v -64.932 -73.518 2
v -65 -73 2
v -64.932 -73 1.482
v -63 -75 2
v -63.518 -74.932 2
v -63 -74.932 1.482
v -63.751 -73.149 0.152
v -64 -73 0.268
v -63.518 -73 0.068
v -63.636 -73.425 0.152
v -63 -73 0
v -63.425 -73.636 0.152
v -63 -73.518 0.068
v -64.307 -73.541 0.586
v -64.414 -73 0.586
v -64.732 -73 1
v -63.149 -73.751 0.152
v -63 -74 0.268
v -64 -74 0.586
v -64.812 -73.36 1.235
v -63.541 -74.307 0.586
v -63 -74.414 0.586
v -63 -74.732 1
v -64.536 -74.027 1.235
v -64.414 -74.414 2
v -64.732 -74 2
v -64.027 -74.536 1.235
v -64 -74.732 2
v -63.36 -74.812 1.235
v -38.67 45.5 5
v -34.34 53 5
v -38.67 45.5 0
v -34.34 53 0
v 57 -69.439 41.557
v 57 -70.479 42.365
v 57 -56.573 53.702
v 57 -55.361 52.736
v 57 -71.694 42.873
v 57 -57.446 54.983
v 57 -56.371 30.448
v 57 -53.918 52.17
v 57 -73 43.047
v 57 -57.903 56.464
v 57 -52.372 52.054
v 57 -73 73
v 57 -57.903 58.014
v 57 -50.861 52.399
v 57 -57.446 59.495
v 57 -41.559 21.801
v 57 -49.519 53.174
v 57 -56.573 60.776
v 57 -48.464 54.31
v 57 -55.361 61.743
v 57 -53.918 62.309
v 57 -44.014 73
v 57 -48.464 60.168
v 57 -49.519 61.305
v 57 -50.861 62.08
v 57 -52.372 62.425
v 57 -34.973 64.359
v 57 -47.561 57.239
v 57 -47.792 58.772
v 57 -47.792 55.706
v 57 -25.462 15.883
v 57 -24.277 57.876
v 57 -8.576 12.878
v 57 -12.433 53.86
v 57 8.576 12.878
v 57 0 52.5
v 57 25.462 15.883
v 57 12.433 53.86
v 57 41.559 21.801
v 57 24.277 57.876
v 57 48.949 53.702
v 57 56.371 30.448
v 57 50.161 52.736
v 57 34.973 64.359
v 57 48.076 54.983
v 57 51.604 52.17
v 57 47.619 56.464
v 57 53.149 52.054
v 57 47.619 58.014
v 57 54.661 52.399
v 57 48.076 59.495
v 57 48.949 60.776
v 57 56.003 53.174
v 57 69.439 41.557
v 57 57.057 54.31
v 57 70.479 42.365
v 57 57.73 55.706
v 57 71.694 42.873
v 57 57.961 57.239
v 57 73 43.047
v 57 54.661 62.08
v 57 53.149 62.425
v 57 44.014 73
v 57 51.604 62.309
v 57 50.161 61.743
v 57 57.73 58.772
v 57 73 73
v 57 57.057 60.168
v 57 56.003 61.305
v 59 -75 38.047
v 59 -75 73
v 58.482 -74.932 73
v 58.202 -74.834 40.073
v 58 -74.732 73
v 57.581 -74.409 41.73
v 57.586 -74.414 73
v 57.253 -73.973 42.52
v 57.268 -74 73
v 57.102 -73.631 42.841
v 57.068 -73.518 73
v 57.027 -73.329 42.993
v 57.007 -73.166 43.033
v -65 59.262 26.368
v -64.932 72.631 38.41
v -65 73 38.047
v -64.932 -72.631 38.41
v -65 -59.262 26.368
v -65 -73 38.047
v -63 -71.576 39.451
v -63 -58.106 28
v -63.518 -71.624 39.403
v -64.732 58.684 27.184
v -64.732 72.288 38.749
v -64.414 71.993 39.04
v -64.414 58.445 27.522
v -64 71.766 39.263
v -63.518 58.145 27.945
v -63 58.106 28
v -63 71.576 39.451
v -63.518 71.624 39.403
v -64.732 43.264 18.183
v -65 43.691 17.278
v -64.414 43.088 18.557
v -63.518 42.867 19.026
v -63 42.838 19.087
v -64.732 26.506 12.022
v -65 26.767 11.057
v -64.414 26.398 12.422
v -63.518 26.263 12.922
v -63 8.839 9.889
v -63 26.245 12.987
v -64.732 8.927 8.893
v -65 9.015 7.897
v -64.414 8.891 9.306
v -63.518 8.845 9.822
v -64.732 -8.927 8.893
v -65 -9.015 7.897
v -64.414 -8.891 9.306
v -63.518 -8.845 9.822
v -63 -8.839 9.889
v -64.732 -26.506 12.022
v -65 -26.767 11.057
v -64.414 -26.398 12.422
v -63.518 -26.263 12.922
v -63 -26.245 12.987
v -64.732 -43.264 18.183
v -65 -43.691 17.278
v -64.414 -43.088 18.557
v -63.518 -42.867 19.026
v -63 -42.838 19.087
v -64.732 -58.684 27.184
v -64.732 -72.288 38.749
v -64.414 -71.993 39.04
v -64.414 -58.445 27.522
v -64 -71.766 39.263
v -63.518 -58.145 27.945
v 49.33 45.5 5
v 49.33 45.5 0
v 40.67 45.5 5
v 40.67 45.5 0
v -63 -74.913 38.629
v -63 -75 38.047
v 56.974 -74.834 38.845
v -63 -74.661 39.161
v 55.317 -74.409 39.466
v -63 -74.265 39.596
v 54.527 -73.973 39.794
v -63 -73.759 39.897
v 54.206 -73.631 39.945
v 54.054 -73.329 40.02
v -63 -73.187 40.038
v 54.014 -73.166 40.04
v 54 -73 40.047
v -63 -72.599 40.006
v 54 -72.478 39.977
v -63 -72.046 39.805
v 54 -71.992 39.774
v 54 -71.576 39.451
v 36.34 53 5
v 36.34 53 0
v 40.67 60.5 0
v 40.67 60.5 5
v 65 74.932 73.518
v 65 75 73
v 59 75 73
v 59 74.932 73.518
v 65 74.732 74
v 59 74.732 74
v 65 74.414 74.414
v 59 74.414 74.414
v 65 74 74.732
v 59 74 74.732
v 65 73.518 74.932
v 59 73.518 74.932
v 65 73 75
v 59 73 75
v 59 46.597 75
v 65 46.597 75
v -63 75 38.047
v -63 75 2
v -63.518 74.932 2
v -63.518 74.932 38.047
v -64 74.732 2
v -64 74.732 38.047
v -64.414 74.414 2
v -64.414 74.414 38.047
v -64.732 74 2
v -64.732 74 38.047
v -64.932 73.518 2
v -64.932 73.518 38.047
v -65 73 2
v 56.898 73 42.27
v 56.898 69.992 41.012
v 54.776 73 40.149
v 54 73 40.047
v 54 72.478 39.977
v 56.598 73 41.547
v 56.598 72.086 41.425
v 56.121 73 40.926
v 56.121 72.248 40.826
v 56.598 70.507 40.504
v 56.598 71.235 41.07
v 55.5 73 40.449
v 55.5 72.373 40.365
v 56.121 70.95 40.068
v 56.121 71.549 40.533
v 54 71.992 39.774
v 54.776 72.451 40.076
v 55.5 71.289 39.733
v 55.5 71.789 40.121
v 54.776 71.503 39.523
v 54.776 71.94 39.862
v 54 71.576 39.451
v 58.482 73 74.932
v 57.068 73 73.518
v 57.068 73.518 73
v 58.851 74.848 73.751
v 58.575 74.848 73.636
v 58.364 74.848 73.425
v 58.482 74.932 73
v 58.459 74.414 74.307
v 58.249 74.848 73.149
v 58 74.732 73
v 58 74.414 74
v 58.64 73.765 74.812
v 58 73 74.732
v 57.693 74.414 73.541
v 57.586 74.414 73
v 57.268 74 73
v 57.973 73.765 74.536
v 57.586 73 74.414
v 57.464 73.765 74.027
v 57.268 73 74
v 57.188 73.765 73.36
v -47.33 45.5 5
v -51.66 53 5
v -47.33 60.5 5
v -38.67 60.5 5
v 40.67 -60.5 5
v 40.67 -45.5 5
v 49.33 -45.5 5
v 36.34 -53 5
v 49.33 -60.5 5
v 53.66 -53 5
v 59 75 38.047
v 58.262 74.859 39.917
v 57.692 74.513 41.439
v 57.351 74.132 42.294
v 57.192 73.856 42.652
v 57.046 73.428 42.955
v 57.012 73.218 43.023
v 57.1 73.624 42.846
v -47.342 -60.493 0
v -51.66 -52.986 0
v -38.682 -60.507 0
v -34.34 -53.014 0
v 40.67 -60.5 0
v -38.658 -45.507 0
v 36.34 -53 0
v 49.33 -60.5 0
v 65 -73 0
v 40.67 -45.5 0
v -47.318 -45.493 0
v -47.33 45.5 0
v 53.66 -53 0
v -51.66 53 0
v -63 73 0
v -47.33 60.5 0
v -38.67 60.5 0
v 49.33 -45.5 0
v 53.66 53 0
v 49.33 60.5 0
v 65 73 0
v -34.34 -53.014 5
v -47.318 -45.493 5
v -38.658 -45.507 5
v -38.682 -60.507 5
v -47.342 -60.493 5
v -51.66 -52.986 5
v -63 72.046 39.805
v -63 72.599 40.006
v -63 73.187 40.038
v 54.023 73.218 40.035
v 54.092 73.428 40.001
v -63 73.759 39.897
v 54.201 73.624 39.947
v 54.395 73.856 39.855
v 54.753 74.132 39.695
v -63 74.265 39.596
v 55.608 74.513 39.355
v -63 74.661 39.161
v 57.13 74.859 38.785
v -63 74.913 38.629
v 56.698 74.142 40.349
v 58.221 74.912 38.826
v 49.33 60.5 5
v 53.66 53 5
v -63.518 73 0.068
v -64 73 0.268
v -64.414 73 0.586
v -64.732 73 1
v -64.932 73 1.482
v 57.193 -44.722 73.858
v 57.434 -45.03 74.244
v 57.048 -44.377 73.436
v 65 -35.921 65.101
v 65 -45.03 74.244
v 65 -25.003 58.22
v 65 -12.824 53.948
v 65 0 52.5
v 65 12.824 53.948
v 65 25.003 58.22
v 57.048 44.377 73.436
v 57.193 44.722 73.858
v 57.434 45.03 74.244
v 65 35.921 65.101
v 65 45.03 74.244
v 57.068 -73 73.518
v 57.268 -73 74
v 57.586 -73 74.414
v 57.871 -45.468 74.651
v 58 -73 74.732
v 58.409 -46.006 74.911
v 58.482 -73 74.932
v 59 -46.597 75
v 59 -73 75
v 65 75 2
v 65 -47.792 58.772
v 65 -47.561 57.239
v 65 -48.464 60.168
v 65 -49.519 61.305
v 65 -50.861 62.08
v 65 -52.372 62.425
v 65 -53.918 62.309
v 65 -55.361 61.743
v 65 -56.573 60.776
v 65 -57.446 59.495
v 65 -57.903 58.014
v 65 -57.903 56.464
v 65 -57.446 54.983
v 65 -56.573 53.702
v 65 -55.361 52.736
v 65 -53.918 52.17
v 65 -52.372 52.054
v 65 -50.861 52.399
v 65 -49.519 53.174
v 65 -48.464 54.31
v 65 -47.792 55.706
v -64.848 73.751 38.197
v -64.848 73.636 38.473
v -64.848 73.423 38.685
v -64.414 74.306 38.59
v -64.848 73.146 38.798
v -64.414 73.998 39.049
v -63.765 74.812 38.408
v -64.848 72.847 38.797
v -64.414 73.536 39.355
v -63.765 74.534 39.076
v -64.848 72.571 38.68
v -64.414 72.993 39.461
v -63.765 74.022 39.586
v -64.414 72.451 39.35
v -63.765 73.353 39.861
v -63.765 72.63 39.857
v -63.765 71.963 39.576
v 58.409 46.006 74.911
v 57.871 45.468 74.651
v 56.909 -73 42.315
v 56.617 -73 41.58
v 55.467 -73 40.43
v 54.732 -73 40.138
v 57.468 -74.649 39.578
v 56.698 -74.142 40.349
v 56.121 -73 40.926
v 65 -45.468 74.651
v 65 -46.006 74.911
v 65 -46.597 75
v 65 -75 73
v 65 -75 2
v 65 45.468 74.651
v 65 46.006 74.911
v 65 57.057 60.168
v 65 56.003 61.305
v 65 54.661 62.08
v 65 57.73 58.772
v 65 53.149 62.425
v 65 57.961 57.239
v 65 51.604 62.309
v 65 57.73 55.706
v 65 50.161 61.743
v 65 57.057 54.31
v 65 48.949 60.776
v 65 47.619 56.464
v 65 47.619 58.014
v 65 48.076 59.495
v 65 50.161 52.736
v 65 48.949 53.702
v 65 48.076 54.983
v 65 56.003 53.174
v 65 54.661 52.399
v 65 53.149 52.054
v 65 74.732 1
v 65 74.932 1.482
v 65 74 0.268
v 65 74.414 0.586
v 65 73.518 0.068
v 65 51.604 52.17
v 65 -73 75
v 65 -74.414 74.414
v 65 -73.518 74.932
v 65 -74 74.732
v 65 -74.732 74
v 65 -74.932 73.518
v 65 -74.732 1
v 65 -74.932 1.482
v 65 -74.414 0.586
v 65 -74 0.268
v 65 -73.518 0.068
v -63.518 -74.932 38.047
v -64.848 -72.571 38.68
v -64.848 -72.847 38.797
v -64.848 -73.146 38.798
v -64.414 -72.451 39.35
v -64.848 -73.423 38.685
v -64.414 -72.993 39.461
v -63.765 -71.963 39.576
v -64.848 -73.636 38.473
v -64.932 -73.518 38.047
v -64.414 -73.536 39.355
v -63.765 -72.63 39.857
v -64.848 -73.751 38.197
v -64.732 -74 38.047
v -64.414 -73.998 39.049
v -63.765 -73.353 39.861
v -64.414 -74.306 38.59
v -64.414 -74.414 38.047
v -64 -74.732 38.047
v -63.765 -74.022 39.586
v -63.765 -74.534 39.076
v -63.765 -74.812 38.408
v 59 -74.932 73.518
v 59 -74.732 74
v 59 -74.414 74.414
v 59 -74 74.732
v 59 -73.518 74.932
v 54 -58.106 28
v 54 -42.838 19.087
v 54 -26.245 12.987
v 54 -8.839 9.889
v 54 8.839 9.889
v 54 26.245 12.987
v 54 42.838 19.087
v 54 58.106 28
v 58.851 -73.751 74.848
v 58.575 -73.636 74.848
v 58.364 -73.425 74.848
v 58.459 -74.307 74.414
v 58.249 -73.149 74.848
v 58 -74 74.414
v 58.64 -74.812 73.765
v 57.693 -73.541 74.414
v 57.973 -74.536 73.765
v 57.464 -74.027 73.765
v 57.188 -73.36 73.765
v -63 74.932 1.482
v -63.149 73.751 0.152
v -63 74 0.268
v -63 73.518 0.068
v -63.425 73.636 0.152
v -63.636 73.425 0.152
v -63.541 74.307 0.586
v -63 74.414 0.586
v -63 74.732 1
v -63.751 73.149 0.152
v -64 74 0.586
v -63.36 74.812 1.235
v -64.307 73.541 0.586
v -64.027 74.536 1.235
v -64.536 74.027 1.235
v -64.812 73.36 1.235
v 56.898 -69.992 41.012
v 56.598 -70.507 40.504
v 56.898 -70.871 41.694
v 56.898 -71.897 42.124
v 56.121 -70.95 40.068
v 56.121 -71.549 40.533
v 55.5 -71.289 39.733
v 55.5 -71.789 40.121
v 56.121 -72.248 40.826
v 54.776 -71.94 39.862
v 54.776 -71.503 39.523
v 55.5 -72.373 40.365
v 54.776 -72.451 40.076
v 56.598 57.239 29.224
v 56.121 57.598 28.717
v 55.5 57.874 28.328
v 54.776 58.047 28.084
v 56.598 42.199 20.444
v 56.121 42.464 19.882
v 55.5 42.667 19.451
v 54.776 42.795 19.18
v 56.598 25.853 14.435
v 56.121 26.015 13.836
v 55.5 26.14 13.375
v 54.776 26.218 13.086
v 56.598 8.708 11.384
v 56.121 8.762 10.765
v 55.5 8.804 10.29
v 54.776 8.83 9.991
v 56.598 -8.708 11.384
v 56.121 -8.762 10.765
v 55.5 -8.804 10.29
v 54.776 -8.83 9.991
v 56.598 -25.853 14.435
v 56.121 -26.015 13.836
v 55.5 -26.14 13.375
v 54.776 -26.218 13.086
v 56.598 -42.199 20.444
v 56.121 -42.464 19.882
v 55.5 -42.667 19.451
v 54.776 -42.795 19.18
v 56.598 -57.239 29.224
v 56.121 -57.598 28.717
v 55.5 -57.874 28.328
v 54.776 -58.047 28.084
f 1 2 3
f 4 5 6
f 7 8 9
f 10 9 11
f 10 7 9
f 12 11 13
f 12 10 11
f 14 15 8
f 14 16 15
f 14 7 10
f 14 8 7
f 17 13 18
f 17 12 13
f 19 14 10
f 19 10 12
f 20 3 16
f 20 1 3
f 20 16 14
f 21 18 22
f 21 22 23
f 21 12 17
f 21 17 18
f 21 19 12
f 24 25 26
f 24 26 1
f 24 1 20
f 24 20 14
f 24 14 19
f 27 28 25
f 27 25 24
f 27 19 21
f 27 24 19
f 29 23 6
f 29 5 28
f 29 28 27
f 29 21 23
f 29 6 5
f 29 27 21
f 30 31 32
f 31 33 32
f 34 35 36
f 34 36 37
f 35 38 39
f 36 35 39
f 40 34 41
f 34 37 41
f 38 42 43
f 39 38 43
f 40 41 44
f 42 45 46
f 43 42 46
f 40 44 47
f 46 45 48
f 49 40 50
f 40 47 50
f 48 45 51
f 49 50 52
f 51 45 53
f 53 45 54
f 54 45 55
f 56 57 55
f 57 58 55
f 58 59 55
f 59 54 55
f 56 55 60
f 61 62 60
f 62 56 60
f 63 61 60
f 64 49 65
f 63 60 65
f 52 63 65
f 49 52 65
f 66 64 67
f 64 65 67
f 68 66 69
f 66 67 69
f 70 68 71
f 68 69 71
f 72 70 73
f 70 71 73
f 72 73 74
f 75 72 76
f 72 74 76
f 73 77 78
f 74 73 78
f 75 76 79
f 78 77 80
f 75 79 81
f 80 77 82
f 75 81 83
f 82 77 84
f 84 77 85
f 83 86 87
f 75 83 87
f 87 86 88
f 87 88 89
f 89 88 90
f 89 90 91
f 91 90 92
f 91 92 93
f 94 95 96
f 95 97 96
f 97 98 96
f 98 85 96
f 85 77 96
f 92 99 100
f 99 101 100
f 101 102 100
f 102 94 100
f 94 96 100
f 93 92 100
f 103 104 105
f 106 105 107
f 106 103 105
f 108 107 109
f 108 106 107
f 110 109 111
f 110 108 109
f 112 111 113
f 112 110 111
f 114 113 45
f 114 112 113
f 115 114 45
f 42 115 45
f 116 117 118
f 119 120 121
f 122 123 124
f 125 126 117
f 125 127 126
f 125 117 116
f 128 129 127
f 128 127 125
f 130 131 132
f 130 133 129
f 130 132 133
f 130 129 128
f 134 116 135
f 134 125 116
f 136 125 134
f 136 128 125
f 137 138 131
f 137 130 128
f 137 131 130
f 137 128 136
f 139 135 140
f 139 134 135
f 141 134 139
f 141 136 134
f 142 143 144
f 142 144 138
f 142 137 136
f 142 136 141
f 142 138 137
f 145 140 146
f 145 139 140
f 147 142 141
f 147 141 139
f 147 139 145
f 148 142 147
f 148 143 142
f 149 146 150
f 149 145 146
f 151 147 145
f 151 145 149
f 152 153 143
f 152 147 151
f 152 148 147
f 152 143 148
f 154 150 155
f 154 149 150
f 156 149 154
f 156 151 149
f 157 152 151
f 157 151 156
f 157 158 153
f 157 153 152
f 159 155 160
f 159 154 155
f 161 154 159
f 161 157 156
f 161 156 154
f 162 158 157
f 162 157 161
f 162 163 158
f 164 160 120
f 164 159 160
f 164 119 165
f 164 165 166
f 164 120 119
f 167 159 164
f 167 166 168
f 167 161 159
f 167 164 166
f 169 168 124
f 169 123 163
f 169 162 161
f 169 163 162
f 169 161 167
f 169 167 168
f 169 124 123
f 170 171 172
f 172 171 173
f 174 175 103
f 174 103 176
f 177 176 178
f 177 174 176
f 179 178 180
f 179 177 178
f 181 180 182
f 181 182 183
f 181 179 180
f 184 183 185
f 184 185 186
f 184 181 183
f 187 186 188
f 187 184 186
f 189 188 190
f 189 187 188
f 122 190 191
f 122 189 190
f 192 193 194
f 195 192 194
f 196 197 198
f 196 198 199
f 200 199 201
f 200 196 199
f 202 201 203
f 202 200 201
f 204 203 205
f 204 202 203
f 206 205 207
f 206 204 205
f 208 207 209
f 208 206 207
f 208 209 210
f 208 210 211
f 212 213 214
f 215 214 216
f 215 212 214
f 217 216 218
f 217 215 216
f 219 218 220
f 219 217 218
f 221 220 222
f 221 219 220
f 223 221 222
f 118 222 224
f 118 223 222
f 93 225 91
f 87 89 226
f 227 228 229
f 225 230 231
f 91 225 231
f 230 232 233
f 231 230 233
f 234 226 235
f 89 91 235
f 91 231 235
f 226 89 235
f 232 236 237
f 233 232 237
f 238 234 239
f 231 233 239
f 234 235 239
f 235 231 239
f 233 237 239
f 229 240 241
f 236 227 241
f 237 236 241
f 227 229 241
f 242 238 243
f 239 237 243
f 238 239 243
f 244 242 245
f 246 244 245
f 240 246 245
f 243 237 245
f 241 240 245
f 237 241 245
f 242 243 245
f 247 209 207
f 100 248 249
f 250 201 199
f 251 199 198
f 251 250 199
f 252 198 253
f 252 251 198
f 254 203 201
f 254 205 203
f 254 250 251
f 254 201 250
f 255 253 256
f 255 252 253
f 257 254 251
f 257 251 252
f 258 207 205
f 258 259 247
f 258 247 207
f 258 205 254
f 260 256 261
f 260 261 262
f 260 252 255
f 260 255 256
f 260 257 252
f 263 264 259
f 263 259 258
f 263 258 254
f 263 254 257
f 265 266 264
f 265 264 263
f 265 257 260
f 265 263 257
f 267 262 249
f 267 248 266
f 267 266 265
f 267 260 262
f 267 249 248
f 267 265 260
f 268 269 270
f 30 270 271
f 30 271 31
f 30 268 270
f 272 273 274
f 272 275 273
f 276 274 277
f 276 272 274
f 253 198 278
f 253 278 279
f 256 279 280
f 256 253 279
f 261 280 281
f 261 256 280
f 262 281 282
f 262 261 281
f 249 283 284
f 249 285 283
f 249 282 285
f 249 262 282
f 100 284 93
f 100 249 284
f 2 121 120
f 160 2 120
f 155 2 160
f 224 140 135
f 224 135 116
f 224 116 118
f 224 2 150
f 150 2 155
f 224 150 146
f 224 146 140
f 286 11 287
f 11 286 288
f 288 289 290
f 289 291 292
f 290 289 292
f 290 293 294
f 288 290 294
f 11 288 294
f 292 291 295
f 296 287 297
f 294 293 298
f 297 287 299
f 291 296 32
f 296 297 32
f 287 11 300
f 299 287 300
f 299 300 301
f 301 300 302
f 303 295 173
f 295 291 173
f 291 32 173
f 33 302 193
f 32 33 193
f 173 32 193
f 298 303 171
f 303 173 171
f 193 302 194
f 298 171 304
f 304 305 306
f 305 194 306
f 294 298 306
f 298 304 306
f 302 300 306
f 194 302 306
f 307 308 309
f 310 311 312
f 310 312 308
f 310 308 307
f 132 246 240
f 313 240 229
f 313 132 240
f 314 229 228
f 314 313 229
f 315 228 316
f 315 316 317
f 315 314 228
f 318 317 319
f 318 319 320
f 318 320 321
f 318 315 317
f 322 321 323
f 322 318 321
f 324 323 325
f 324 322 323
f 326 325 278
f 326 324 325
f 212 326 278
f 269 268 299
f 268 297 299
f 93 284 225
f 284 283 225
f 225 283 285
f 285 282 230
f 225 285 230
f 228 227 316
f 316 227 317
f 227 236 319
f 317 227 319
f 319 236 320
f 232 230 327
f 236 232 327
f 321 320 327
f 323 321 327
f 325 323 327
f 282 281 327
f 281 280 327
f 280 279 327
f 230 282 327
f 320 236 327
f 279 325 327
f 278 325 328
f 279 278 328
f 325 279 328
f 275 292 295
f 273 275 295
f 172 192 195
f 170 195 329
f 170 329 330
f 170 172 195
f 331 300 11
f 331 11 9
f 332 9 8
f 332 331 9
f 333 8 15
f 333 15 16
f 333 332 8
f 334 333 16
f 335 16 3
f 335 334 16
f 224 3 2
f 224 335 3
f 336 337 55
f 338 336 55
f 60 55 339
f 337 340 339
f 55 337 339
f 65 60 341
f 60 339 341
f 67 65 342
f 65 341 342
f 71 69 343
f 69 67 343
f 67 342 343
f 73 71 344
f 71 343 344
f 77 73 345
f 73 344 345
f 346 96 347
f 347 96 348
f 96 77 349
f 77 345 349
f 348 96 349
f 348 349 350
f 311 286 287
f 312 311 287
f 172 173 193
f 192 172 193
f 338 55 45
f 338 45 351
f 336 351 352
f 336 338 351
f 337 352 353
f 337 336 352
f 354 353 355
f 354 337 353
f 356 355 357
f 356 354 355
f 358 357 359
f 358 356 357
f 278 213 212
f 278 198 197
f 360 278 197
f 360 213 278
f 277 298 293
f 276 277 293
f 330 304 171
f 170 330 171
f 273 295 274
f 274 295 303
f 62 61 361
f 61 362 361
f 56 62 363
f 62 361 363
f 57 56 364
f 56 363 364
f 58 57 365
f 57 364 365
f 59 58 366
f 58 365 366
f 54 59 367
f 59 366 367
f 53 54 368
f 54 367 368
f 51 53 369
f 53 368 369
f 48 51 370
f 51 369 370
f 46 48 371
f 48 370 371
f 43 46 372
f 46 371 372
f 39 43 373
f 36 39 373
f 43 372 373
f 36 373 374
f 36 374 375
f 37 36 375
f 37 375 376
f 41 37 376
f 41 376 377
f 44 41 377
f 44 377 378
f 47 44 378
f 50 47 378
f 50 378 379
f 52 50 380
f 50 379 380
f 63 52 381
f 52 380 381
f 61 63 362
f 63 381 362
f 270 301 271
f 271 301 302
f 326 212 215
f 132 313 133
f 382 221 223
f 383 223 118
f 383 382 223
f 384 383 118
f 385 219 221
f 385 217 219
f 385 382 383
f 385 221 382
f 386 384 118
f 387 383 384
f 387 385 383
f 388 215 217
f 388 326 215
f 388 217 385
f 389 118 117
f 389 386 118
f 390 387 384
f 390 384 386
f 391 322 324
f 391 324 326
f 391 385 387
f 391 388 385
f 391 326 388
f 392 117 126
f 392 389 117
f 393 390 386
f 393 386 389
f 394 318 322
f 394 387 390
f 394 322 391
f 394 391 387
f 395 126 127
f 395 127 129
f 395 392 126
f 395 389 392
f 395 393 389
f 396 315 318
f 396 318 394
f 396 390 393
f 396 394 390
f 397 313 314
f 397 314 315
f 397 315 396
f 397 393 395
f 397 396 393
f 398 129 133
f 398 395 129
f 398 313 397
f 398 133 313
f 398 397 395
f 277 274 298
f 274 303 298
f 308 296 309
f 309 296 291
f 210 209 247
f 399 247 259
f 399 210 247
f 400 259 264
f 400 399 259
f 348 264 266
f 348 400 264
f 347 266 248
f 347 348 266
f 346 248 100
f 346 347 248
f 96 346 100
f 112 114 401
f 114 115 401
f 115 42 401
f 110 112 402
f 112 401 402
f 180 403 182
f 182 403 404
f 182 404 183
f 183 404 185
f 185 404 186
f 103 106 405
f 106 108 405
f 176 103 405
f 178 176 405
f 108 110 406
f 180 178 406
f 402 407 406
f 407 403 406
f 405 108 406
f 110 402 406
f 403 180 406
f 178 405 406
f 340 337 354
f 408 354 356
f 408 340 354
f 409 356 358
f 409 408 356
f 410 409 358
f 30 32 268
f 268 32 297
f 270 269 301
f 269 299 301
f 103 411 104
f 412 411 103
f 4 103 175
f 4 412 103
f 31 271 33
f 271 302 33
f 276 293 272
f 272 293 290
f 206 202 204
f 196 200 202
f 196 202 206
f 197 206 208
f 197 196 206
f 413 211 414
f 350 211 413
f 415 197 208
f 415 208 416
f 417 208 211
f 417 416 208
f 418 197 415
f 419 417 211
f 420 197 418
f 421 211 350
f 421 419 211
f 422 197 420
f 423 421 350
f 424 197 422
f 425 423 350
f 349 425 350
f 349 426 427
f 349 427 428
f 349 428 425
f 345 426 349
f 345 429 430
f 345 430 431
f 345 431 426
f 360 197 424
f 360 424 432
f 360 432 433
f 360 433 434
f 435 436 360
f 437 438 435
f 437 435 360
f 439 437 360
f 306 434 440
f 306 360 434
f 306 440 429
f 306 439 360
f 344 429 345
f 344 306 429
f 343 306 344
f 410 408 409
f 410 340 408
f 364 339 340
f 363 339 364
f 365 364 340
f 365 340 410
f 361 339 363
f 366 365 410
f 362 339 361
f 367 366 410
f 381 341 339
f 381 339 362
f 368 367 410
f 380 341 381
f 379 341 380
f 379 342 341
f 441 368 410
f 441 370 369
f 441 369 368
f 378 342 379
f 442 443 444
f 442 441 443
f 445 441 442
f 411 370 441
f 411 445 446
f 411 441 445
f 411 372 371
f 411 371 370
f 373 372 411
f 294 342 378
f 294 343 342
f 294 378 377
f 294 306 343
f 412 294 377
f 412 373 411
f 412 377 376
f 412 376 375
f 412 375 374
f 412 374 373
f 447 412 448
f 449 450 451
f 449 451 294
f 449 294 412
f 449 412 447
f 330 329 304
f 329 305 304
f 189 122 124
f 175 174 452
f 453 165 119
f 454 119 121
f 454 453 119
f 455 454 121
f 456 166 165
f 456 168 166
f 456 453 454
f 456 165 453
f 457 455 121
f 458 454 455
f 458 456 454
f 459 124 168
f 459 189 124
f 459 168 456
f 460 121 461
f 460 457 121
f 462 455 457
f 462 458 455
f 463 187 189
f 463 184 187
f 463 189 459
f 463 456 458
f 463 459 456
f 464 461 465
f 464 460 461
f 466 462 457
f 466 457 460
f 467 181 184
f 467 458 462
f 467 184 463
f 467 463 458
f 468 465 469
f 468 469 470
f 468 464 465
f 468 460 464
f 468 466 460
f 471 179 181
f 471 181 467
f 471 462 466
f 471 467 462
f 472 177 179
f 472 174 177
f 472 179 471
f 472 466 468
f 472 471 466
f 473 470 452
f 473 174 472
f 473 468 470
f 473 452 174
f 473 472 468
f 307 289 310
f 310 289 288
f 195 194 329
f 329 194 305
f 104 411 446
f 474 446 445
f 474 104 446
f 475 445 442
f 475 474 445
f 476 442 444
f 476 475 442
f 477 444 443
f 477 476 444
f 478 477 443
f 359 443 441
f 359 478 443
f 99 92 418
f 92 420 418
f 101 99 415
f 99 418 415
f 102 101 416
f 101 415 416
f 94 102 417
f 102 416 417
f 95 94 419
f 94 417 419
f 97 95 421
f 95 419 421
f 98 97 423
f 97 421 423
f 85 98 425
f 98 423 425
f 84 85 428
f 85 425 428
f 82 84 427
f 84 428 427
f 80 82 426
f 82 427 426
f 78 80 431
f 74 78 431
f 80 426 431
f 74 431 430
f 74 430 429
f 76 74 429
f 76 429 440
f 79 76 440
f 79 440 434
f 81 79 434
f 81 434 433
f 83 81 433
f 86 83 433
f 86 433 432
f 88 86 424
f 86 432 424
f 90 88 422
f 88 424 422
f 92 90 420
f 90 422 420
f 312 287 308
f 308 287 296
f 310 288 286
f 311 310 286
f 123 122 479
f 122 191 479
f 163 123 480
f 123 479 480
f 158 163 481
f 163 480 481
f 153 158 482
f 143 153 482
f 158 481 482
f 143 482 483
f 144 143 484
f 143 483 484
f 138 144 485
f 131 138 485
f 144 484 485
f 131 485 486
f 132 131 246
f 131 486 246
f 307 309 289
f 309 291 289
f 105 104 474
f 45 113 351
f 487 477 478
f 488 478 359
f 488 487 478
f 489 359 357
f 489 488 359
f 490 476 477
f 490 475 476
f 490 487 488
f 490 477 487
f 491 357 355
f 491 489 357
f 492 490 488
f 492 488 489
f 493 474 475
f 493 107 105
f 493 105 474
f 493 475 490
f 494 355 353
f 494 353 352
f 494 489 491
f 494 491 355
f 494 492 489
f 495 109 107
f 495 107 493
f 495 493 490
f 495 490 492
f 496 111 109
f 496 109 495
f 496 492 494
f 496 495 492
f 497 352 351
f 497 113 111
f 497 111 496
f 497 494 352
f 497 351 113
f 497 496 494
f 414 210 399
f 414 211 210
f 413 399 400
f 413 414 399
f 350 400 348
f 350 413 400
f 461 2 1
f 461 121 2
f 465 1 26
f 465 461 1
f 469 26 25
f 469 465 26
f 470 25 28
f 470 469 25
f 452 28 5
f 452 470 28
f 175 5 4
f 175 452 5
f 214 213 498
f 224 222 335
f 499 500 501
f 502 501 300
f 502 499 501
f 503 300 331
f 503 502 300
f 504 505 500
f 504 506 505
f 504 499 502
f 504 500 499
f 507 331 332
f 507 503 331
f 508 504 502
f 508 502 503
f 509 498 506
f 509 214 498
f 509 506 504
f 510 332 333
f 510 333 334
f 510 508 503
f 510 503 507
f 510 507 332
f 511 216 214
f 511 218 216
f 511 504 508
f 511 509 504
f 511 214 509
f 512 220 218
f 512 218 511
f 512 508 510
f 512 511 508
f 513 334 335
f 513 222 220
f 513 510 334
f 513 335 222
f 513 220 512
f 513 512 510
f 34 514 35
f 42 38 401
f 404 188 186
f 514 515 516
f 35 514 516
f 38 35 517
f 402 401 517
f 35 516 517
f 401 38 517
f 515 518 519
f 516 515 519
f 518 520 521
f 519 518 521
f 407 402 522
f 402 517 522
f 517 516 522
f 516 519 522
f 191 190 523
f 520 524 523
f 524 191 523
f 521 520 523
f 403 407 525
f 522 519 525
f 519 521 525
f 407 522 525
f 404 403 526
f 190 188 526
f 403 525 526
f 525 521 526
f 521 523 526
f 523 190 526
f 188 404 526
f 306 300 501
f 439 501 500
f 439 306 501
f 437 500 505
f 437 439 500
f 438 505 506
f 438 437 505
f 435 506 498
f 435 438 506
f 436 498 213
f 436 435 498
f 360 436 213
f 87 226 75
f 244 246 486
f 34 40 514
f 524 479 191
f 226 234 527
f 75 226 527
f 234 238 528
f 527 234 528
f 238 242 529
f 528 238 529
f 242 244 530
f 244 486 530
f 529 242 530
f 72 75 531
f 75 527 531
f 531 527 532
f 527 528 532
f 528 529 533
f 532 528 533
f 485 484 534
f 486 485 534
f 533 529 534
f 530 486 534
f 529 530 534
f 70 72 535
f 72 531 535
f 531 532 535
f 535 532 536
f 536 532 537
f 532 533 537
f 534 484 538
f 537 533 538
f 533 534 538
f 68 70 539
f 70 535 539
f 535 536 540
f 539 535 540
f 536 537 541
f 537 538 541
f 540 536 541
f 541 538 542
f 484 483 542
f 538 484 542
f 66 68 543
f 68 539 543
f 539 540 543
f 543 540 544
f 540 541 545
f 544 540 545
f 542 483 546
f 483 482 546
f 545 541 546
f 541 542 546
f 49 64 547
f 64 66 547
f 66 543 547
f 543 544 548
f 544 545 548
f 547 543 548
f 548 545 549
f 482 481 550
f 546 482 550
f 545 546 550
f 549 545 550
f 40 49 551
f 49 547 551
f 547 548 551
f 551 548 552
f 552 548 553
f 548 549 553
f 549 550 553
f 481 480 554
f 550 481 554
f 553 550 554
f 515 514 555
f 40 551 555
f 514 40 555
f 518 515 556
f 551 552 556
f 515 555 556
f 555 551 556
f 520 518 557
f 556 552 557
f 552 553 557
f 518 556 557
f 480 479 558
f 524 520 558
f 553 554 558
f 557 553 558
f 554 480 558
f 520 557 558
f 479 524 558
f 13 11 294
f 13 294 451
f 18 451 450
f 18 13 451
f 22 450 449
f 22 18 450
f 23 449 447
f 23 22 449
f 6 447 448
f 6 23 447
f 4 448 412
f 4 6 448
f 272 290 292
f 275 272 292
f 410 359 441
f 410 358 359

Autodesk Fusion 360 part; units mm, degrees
sketch "Sketch1" plane through (0, 0, 0) normal (0, 0, 1) x (1, 0, 0)
  line L0 (65, -75) -> (-65, -75)
  line L1 (-65, -75) -> (-65, 75)
  line L2 (-65, 75) -> (65, 75)
  line L3 (65, 75) -> (65, -75)
  line L4 (65, -75) -> (-65, 75) construction
  line L5 (-65, -75) -> (65, 75) construction
  dimension "d1" = 130
  dimension "d2" = 150
extrude "Extrude1" add sketch "Sketch1" along normal blind 75
sketch "Sketch2" plane through (65, 0, 0) normal (1, 0, 0) x (0, 1, 0)
  line L0 (-75, 0) -> (75, 0)
  line L1 (75, 0) -> (75, 75)
  line L2 (75, 75) -> (-75, 75)
  line L3 (-75, 75) -> (-75, 0)
  line L4 (0, 0) -> (0, 10)
  line L5 (0, 10) -> (0, 110)
  circle A0 centre (0, 110) radius 100.5
  circle A1 centre (0, 110) radius 74.615
  line L6 (0, 110) -> (52.7608, 57.2392)
  line L7 (0, 110) -> (74.615, 110) construction
  line L8 (0, 110) -> (-52.7608, 57.2392)
  line L9 (0, 110) -> (74.615, 110) construction
  circle A2 centre (52.7608, 57.2392) radius 5.2
  circle A3 centre (-52.7608, 57.2392) radius 5.2
  circle A4 centre (0, 110) radius 57.5
  dimension "d5" = 10
  dimension "d6" = 100
  dimension "d7" = 201
  dimension "d8" = 149.23
  dimension "d9" = 45
  dimension "d10" = 135
  dimension "d11" = 10.4
  dimension "d12" = 10.4
  dimension "d13" = 115
extrude "Extrude2" cut sketch "Sketch2" against normal blind 130 contours L2 L6 L8 A4 | L2 L8 A4 | L2 L5 L8 A4 | L2 L5 L6 A4 | L2 L5 L8 | L2 L6 A4 | L2 L5 L6
extrude "Extrude3" cut sketch "Sketch2" against normal blind 122 from surface at -8 contours L2 L3 L4 L5 A0 A1 A3 | L1 L2 L4 L5 A0 A1 A2 | L2 A1 L8 A3 A4 | L5 A1 L8 A3 A4 | L5 A1 L6 A2 A4 | A1 L8 A3 | A1 A3 | L2 A1 L6 A2 A4 | A1 L8 A3 | A1 L6 A2 | A1 A2 | A1 L6 A2
extrude "Extrude4" cut sketch "Sketch2" against normal blind 10 contours A1 L8 A3 | A1 A3 | A1 L8 A3 | A1 L6 A2 | A1 A2 | A1 L6 A2
fillet "Fillet1" radius 2 16 edges at (-65, 75, 21.5513) (-65, -75, 21.5513) (0, -75, 0) (0, 75, 0) (-4, -75, 43.1027) (-4, 75, 43.1027) (57, 60.3104, 75) (57, 75, 59.0513) (57, -75, 59.0513) (57, -60.3104, 75) (-65, 0, 9.5) (-65, 0, 0) (61, -75, 75) (61, 75, 75) (61, 45.6207, 75) (61, -45.6207, 75)
fillet "Fillet2" radius 3 5 edges at (57.5858, -74.4142, 39.4611) (57, -72.228, 39.8919) (57, 0, 9.5) (57, 72.228, 39.8919) (57.5858, 74.4142, 39.4611)
sketch "Sketch3" plane through (0, 0, 0) normal (0, 0, -1) x (1, 0, 0)
  line L0 (-63, -73) -> (65, -73)
  line L1 (65, -73) -> (65, 73)
  line L2 (65, 73) -> (-63, 73)
  line L3 (-63, 73) -> (-63, -73)
  line L4 (-63, 73) -> (-43, 73)
  line L5 (-43, 73) -> (-43, 53)
  line L6 (-38.6582, 45.5068) -> (-34.3398, 53.0135)
  line L7 (-34.3398, 53.0135) -> (-38.6816, 60.5067)
  line L8 (-38.6816, 60.5067) -> (-47.3418, 60.4932)
  line L9 (-47.3418, 60.4932) -> (-51.6602, 52.9865)
  line L10 (-51.6602, 52.9865) -> (-47.3184, 45.4933)
  line L11 (-47.3184, 45.4933) -> (-38.6582, 45.5068)
  line L12 (65, 73) -> (45, 73)
  line L13 (45, 73) -> (45, 53)
  line L14 (49.3301, 45.5) -> (53.6603, 53)
  line L15 (53.6603, 53) -> (49.3301, 60.5)
  line L16 (49.3301, 60.5) -> (40.6699, 60.5)
  line L17 (40.6699, 60.5) -> (36.3397, 53)
  line L18 (36.3397, 53) -> (40.6699, 45.5)
  line L19 (40.6699, 45.5) -> (49.3301, 45.5)
  line L20 (-63, -73) -> (-63, -53)
  line L21 (-63, -53) -> (-43, -53)
  line L22 (-38.6699, -60.5) -> (-34.3397, -53)
  line L23 (-34.3397, -53) -> (-38.6699, -45.5)
  line L24 (-38.6699, -45.5) -> (-47.3301, -45.5)
  line L25 (-47.3301, -45.5) -> (-51.6603, -53)
  line L26 (-51.6603, -53) -> (-47.3301, -60.5)
  line L27 (-47.3301, -60.5) -> (-38.6699, -60.5)
  line L28 (65, -73) -> (45, -73)
  line L29 (45, -73) -> (45, -53)
  line L30 (49.3301, -60.5) -> (53.6603, -53)
  line L31 (53.6603, -53) -> (49.3301, -45.5)
  line L32 (49.3301, -45.5) -> (40.6699, -45.5)
  line L33 (40.6699, -45.5) -> (36.3397, -53)
  line L34 (36.3397, -53) -> (40.6699, -60.5)
  line L35 (40.6699, -60.5) -> (49.3301, -60.5)
  point P0 (-43, 53)
  point P1 (45, 53)
  point P2 (-43, -53)
  point P3 (45, -53)
  dimension "d45" = 20
  dimension "d46" = 20
  dimension "d47" = 7.5
  dimension "d48" = 20
  dimension "d49" = 20
  dimension "d50" = 7.5
  dimension "d51" = 20
  dimension "d52" = 20
  dimension "d53" = 7.5
  dimension "d54" = 20
  dimension "d55" = 20
  dimension "d56" = 7.5
extrude "Extrude5" cut sketch "Sketch3" against normal blind 5 contours L30 L31 L32 L33 L34 L35 | L14 L15 L16 L17 L18 L19 | L6 L7 L8 L9 L10 L11 | L22 L23 L24 L25 L26 L27
